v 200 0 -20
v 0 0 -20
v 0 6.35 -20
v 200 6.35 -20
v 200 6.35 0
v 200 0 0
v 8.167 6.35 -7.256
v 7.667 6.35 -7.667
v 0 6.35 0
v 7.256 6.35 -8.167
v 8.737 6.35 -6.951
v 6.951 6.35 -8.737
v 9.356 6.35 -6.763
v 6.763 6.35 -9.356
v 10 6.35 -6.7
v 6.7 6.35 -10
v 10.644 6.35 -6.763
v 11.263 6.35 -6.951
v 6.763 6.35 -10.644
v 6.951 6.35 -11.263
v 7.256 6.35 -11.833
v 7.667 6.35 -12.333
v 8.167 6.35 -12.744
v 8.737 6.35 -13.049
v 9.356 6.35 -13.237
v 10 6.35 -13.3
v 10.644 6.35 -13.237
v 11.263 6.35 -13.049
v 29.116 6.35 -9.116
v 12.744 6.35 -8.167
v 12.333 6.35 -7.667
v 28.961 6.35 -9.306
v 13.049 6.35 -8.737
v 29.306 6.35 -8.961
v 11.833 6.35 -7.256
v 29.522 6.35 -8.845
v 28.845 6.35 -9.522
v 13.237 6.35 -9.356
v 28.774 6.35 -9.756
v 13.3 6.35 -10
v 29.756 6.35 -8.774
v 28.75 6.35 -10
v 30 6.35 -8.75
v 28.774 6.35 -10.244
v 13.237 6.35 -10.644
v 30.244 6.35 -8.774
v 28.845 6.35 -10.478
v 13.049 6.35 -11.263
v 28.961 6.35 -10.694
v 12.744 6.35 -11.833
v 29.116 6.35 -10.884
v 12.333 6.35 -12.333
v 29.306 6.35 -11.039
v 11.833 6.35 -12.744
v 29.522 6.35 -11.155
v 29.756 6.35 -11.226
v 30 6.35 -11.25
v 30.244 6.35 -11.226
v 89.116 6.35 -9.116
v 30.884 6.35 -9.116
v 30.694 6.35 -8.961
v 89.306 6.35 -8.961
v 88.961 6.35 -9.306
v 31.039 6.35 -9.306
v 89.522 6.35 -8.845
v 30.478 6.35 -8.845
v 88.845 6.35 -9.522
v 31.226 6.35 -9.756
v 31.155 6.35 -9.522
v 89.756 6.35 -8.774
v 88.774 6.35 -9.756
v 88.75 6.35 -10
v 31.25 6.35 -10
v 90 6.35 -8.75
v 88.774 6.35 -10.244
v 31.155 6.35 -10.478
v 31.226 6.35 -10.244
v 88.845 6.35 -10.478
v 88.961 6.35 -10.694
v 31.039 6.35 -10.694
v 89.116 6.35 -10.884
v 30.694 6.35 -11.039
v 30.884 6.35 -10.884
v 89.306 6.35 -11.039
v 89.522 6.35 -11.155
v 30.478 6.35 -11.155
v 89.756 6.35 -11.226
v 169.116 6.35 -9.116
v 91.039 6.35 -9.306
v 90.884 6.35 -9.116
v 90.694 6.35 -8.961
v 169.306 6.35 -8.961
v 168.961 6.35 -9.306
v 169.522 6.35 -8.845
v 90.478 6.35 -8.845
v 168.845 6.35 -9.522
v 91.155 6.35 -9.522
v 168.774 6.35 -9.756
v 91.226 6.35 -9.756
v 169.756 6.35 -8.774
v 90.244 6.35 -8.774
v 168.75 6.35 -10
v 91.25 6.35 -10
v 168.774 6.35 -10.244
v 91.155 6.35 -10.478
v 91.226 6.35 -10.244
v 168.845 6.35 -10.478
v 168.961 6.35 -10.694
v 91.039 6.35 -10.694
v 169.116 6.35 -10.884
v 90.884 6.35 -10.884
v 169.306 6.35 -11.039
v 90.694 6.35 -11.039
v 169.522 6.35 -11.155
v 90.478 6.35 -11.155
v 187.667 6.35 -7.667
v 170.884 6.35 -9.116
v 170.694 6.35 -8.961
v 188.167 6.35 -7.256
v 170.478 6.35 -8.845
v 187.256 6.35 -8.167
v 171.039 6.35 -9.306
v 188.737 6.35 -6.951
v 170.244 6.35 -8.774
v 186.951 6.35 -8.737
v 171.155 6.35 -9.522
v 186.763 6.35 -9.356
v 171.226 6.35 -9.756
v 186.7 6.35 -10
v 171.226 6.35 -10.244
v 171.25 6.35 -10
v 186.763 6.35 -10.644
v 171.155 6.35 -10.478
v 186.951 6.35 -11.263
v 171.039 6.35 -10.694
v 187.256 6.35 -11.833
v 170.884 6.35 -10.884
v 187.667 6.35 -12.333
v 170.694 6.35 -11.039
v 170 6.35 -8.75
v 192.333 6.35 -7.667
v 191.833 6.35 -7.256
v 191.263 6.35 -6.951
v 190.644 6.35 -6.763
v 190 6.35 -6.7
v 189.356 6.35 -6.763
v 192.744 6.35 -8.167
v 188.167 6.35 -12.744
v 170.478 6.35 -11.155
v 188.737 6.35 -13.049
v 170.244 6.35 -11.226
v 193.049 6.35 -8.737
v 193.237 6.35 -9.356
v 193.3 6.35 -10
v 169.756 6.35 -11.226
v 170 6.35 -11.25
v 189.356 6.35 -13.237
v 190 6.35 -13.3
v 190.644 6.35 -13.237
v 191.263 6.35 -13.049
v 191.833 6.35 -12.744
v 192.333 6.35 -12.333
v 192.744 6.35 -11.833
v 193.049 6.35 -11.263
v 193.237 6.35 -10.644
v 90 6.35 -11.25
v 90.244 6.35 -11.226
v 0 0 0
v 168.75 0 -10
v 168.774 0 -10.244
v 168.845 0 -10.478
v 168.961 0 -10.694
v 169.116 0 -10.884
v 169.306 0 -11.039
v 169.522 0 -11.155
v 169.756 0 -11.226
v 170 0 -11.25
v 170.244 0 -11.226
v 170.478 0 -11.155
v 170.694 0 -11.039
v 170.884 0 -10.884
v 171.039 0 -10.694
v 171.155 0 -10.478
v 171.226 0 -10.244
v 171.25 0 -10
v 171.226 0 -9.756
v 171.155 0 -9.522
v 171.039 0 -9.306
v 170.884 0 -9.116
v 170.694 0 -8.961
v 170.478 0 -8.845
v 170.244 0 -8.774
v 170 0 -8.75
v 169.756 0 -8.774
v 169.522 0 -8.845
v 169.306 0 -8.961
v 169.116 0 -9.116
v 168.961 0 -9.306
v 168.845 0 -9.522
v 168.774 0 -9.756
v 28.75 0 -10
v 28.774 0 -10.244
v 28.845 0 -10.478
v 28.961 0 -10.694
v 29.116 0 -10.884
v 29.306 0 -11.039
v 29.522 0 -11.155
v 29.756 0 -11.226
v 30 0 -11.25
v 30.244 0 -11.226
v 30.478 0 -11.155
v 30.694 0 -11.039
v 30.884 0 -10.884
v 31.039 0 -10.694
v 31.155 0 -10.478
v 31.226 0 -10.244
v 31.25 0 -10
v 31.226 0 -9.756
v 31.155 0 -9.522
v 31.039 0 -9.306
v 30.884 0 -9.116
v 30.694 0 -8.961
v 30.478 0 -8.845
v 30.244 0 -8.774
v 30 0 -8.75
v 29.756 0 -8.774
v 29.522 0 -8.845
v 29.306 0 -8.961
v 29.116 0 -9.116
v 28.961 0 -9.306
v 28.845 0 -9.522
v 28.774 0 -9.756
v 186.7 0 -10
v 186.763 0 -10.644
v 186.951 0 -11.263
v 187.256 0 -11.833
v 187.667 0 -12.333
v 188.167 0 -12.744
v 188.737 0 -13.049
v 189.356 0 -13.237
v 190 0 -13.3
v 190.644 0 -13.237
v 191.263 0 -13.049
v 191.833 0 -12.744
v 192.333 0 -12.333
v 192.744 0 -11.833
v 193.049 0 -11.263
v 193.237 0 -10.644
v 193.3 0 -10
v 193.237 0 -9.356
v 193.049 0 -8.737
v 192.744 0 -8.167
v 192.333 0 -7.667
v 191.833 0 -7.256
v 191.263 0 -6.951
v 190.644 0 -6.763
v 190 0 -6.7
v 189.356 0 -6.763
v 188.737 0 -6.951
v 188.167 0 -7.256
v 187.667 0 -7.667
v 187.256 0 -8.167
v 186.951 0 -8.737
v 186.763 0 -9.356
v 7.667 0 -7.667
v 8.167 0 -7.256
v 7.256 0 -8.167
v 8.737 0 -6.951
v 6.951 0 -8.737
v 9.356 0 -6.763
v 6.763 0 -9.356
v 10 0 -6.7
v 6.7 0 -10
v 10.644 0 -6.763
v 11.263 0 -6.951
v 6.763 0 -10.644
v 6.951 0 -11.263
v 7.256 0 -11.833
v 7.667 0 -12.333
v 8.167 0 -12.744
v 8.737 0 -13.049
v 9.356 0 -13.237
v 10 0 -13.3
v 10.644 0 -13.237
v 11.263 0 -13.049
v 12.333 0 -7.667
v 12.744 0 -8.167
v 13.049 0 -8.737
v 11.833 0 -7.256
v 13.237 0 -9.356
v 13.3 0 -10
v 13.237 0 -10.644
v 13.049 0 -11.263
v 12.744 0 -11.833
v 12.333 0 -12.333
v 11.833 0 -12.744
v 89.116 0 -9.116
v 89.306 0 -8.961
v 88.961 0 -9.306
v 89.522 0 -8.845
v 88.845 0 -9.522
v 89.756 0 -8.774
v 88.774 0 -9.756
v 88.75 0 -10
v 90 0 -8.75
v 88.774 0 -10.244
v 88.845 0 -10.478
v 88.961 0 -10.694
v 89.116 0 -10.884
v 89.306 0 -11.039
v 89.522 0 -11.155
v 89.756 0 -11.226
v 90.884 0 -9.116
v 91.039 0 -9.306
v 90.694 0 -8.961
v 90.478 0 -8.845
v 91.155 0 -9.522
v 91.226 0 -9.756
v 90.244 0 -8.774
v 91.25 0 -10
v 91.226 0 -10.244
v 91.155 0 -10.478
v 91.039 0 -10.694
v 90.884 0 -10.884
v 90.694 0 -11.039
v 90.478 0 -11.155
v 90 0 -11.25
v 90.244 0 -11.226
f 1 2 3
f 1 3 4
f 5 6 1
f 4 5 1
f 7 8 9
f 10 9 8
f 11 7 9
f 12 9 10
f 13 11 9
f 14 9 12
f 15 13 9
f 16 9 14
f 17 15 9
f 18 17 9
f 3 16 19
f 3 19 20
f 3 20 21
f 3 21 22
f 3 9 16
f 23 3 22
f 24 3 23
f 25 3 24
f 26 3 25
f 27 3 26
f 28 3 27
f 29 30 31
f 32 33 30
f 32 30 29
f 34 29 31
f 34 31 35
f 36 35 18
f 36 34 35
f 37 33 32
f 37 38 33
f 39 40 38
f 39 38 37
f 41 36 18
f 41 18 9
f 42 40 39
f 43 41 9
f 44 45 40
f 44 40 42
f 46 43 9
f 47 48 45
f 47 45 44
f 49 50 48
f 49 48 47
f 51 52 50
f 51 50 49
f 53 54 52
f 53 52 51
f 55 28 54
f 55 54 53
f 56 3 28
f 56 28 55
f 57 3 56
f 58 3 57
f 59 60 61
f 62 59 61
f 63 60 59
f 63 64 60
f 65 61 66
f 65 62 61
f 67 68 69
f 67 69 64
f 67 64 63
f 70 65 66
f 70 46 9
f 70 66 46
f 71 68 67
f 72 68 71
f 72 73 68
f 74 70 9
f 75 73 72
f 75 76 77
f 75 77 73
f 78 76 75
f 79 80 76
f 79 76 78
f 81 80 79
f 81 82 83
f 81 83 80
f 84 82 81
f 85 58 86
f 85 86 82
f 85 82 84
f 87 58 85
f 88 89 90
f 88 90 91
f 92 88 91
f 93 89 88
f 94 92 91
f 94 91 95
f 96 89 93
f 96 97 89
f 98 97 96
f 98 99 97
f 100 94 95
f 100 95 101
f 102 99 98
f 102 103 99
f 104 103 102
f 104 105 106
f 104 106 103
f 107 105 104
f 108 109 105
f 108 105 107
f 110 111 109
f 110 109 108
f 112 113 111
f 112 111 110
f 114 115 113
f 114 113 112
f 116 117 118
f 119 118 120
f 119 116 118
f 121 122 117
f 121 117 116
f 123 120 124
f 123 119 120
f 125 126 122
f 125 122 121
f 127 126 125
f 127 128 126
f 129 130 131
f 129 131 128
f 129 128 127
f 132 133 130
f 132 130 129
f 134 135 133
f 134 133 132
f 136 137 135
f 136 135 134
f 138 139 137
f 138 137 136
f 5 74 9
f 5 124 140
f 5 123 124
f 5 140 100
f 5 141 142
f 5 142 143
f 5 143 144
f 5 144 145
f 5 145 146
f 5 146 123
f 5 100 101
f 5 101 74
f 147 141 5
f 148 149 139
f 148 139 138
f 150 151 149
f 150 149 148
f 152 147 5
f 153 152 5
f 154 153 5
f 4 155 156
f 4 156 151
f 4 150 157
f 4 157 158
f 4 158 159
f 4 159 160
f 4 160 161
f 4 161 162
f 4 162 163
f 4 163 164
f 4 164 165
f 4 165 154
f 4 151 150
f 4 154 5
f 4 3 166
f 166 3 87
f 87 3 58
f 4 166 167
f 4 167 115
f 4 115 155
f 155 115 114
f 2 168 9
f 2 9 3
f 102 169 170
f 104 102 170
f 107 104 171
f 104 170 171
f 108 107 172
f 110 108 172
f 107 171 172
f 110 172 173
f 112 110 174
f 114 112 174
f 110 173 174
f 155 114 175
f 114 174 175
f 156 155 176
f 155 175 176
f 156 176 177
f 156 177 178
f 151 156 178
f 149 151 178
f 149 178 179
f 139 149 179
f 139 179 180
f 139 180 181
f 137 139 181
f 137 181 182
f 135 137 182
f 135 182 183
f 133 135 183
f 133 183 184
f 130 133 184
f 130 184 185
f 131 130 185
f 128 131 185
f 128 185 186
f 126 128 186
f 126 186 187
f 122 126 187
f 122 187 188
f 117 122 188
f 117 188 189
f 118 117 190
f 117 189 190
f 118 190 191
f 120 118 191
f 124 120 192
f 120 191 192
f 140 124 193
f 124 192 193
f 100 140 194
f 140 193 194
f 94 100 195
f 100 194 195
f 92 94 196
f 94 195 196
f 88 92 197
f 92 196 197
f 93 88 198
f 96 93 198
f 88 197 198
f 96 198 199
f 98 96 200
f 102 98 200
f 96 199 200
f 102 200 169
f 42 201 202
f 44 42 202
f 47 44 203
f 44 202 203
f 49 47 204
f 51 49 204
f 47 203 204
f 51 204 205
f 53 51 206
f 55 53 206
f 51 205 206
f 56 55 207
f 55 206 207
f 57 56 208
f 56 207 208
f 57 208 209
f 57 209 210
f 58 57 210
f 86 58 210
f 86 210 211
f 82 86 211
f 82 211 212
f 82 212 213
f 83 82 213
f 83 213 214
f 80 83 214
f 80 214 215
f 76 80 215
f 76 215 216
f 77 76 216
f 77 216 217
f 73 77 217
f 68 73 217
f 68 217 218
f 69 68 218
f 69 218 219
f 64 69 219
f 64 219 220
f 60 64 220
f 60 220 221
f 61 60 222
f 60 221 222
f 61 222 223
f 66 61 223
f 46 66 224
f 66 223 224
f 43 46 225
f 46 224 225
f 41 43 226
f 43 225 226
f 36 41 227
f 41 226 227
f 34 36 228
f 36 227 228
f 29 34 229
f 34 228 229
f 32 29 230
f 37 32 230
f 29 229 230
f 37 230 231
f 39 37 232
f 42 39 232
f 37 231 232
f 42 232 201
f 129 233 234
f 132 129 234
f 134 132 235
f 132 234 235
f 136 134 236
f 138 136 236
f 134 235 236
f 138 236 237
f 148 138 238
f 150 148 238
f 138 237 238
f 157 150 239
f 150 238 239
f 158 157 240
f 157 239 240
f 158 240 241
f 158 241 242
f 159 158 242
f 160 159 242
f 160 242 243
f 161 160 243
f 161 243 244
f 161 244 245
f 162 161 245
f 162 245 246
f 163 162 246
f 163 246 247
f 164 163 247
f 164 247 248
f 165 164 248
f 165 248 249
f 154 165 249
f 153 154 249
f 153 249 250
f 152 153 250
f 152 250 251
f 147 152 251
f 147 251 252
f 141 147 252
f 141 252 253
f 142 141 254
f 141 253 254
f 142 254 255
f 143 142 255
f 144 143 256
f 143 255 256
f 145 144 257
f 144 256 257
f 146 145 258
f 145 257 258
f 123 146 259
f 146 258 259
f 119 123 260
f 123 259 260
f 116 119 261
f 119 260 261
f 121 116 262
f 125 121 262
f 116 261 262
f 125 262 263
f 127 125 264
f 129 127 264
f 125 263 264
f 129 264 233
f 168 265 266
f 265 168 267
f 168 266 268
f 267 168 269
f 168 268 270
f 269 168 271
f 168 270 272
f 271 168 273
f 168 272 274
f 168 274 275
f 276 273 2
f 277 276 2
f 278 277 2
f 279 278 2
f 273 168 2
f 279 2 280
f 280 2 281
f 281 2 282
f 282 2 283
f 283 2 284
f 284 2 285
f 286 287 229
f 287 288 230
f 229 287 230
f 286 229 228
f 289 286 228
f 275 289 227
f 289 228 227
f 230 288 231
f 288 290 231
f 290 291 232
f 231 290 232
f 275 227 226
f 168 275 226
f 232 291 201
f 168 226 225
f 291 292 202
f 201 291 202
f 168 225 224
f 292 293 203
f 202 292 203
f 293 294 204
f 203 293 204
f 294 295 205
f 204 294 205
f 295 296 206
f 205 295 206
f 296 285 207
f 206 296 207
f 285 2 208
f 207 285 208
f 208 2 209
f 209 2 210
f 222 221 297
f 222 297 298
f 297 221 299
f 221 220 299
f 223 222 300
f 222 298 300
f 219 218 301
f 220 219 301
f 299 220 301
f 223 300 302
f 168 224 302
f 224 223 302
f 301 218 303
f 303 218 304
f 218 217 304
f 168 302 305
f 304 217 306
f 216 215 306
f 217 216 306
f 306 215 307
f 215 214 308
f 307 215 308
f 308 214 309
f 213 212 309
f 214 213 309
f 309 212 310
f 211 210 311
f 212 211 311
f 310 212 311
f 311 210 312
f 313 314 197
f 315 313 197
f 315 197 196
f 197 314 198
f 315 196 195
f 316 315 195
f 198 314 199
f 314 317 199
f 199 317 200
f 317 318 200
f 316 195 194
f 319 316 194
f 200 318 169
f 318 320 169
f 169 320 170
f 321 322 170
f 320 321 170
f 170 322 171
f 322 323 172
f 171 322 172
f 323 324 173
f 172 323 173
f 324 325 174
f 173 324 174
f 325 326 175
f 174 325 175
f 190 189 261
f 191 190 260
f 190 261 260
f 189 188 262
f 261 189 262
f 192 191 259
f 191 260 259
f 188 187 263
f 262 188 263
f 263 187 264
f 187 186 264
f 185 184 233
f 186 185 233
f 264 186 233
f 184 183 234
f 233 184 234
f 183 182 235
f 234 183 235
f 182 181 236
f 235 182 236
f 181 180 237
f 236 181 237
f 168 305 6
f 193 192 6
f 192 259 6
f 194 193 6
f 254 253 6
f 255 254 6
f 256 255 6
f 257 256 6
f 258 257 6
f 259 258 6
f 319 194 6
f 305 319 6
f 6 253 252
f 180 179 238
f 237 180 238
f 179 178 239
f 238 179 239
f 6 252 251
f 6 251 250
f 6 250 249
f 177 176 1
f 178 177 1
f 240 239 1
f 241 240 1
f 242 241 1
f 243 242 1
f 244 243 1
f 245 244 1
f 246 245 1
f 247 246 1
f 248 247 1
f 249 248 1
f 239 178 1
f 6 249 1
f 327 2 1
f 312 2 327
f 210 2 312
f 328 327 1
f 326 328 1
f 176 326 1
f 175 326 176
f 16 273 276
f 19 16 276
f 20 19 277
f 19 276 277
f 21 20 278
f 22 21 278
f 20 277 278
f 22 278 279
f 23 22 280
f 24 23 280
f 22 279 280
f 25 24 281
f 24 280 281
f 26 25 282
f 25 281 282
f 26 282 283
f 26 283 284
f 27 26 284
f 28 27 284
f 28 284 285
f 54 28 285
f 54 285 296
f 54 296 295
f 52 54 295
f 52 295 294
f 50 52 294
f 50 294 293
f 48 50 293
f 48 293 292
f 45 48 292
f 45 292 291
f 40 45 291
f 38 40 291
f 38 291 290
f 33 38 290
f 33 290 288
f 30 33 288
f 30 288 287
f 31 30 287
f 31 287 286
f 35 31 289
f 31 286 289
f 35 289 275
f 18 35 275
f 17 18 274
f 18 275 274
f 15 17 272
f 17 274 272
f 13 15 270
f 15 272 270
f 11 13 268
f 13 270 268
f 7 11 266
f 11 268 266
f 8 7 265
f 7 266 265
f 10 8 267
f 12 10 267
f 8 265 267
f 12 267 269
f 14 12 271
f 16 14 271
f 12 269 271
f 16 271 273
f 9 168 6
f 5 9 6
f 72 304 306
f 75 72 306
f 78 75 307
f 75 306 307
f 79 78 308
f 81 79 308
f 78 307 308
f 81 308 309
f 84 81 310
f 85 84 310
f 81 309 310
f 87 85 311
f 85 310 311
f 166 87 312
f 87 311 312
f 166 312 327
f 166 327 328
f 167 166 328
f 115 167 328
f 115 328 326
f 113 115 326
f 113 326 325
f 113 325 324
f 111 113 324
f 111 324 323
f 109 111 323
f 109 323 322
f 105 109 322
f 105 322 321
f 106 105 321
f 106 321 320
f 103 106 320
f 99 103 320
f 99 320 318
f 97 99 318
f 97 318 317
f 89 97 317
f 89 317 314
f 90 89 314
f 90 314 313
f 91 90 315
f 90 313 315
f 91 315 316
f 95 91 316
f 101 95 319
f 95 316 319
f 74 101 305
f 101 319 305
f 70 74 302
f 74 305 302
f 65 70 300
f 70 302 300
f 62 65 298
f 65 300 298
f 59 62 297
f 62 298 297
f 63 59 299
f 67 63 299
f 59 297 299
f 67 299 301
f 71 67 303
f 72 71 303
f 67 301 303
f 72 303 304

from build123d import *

# Parameters (mm, degrees)
SKETCH1_W             = 200
SKETCH1_H             = 20
BOSS_EXTRUDE1_DEPTH   = 6.35
M3X0_5_TAPPED_HOLE1_D = 2.5
M6_CLEARANCE_HOLE1_D  = 6.6


with BuildPart() as part:
    # Sketch1 → Boss-Extrude1 (new body)
    with BuildSketch(Plane(origin=(0, 0, 0), x_dir=(1, 0, 0), z_dir=(0, 1, 0))):
        with Locations((100, 10)):
            Rectangle(SKETCH1_W, SKETCH1_H)
    extrude(amount=BOSS_EXTRUDE1_DEPTH)

    # M3x0.5 Tapped Hole1 (through all)
    with Locations(Plane(origin=(0, 6.35, 0), x_dir=(1, 0, 0), z_dir=(0, 1, 0))):
        with Locations((30, 10), (170, 10), (90, 10)):
            Hole(M3X0_5_TAPPED_HOLE1_D / 2)

    # M6 Clearance Hole1 (through all)
    with Locations(Plane(origin=(0, 6.35, 0), x_dir=(1, 0, 0), z_dir=(0, 1, 0))):
        with Locations((10, 10), (190, 10)):
            Hole(M6_CLEARANCE_HOLE1_D / 2)


solid = part.part
